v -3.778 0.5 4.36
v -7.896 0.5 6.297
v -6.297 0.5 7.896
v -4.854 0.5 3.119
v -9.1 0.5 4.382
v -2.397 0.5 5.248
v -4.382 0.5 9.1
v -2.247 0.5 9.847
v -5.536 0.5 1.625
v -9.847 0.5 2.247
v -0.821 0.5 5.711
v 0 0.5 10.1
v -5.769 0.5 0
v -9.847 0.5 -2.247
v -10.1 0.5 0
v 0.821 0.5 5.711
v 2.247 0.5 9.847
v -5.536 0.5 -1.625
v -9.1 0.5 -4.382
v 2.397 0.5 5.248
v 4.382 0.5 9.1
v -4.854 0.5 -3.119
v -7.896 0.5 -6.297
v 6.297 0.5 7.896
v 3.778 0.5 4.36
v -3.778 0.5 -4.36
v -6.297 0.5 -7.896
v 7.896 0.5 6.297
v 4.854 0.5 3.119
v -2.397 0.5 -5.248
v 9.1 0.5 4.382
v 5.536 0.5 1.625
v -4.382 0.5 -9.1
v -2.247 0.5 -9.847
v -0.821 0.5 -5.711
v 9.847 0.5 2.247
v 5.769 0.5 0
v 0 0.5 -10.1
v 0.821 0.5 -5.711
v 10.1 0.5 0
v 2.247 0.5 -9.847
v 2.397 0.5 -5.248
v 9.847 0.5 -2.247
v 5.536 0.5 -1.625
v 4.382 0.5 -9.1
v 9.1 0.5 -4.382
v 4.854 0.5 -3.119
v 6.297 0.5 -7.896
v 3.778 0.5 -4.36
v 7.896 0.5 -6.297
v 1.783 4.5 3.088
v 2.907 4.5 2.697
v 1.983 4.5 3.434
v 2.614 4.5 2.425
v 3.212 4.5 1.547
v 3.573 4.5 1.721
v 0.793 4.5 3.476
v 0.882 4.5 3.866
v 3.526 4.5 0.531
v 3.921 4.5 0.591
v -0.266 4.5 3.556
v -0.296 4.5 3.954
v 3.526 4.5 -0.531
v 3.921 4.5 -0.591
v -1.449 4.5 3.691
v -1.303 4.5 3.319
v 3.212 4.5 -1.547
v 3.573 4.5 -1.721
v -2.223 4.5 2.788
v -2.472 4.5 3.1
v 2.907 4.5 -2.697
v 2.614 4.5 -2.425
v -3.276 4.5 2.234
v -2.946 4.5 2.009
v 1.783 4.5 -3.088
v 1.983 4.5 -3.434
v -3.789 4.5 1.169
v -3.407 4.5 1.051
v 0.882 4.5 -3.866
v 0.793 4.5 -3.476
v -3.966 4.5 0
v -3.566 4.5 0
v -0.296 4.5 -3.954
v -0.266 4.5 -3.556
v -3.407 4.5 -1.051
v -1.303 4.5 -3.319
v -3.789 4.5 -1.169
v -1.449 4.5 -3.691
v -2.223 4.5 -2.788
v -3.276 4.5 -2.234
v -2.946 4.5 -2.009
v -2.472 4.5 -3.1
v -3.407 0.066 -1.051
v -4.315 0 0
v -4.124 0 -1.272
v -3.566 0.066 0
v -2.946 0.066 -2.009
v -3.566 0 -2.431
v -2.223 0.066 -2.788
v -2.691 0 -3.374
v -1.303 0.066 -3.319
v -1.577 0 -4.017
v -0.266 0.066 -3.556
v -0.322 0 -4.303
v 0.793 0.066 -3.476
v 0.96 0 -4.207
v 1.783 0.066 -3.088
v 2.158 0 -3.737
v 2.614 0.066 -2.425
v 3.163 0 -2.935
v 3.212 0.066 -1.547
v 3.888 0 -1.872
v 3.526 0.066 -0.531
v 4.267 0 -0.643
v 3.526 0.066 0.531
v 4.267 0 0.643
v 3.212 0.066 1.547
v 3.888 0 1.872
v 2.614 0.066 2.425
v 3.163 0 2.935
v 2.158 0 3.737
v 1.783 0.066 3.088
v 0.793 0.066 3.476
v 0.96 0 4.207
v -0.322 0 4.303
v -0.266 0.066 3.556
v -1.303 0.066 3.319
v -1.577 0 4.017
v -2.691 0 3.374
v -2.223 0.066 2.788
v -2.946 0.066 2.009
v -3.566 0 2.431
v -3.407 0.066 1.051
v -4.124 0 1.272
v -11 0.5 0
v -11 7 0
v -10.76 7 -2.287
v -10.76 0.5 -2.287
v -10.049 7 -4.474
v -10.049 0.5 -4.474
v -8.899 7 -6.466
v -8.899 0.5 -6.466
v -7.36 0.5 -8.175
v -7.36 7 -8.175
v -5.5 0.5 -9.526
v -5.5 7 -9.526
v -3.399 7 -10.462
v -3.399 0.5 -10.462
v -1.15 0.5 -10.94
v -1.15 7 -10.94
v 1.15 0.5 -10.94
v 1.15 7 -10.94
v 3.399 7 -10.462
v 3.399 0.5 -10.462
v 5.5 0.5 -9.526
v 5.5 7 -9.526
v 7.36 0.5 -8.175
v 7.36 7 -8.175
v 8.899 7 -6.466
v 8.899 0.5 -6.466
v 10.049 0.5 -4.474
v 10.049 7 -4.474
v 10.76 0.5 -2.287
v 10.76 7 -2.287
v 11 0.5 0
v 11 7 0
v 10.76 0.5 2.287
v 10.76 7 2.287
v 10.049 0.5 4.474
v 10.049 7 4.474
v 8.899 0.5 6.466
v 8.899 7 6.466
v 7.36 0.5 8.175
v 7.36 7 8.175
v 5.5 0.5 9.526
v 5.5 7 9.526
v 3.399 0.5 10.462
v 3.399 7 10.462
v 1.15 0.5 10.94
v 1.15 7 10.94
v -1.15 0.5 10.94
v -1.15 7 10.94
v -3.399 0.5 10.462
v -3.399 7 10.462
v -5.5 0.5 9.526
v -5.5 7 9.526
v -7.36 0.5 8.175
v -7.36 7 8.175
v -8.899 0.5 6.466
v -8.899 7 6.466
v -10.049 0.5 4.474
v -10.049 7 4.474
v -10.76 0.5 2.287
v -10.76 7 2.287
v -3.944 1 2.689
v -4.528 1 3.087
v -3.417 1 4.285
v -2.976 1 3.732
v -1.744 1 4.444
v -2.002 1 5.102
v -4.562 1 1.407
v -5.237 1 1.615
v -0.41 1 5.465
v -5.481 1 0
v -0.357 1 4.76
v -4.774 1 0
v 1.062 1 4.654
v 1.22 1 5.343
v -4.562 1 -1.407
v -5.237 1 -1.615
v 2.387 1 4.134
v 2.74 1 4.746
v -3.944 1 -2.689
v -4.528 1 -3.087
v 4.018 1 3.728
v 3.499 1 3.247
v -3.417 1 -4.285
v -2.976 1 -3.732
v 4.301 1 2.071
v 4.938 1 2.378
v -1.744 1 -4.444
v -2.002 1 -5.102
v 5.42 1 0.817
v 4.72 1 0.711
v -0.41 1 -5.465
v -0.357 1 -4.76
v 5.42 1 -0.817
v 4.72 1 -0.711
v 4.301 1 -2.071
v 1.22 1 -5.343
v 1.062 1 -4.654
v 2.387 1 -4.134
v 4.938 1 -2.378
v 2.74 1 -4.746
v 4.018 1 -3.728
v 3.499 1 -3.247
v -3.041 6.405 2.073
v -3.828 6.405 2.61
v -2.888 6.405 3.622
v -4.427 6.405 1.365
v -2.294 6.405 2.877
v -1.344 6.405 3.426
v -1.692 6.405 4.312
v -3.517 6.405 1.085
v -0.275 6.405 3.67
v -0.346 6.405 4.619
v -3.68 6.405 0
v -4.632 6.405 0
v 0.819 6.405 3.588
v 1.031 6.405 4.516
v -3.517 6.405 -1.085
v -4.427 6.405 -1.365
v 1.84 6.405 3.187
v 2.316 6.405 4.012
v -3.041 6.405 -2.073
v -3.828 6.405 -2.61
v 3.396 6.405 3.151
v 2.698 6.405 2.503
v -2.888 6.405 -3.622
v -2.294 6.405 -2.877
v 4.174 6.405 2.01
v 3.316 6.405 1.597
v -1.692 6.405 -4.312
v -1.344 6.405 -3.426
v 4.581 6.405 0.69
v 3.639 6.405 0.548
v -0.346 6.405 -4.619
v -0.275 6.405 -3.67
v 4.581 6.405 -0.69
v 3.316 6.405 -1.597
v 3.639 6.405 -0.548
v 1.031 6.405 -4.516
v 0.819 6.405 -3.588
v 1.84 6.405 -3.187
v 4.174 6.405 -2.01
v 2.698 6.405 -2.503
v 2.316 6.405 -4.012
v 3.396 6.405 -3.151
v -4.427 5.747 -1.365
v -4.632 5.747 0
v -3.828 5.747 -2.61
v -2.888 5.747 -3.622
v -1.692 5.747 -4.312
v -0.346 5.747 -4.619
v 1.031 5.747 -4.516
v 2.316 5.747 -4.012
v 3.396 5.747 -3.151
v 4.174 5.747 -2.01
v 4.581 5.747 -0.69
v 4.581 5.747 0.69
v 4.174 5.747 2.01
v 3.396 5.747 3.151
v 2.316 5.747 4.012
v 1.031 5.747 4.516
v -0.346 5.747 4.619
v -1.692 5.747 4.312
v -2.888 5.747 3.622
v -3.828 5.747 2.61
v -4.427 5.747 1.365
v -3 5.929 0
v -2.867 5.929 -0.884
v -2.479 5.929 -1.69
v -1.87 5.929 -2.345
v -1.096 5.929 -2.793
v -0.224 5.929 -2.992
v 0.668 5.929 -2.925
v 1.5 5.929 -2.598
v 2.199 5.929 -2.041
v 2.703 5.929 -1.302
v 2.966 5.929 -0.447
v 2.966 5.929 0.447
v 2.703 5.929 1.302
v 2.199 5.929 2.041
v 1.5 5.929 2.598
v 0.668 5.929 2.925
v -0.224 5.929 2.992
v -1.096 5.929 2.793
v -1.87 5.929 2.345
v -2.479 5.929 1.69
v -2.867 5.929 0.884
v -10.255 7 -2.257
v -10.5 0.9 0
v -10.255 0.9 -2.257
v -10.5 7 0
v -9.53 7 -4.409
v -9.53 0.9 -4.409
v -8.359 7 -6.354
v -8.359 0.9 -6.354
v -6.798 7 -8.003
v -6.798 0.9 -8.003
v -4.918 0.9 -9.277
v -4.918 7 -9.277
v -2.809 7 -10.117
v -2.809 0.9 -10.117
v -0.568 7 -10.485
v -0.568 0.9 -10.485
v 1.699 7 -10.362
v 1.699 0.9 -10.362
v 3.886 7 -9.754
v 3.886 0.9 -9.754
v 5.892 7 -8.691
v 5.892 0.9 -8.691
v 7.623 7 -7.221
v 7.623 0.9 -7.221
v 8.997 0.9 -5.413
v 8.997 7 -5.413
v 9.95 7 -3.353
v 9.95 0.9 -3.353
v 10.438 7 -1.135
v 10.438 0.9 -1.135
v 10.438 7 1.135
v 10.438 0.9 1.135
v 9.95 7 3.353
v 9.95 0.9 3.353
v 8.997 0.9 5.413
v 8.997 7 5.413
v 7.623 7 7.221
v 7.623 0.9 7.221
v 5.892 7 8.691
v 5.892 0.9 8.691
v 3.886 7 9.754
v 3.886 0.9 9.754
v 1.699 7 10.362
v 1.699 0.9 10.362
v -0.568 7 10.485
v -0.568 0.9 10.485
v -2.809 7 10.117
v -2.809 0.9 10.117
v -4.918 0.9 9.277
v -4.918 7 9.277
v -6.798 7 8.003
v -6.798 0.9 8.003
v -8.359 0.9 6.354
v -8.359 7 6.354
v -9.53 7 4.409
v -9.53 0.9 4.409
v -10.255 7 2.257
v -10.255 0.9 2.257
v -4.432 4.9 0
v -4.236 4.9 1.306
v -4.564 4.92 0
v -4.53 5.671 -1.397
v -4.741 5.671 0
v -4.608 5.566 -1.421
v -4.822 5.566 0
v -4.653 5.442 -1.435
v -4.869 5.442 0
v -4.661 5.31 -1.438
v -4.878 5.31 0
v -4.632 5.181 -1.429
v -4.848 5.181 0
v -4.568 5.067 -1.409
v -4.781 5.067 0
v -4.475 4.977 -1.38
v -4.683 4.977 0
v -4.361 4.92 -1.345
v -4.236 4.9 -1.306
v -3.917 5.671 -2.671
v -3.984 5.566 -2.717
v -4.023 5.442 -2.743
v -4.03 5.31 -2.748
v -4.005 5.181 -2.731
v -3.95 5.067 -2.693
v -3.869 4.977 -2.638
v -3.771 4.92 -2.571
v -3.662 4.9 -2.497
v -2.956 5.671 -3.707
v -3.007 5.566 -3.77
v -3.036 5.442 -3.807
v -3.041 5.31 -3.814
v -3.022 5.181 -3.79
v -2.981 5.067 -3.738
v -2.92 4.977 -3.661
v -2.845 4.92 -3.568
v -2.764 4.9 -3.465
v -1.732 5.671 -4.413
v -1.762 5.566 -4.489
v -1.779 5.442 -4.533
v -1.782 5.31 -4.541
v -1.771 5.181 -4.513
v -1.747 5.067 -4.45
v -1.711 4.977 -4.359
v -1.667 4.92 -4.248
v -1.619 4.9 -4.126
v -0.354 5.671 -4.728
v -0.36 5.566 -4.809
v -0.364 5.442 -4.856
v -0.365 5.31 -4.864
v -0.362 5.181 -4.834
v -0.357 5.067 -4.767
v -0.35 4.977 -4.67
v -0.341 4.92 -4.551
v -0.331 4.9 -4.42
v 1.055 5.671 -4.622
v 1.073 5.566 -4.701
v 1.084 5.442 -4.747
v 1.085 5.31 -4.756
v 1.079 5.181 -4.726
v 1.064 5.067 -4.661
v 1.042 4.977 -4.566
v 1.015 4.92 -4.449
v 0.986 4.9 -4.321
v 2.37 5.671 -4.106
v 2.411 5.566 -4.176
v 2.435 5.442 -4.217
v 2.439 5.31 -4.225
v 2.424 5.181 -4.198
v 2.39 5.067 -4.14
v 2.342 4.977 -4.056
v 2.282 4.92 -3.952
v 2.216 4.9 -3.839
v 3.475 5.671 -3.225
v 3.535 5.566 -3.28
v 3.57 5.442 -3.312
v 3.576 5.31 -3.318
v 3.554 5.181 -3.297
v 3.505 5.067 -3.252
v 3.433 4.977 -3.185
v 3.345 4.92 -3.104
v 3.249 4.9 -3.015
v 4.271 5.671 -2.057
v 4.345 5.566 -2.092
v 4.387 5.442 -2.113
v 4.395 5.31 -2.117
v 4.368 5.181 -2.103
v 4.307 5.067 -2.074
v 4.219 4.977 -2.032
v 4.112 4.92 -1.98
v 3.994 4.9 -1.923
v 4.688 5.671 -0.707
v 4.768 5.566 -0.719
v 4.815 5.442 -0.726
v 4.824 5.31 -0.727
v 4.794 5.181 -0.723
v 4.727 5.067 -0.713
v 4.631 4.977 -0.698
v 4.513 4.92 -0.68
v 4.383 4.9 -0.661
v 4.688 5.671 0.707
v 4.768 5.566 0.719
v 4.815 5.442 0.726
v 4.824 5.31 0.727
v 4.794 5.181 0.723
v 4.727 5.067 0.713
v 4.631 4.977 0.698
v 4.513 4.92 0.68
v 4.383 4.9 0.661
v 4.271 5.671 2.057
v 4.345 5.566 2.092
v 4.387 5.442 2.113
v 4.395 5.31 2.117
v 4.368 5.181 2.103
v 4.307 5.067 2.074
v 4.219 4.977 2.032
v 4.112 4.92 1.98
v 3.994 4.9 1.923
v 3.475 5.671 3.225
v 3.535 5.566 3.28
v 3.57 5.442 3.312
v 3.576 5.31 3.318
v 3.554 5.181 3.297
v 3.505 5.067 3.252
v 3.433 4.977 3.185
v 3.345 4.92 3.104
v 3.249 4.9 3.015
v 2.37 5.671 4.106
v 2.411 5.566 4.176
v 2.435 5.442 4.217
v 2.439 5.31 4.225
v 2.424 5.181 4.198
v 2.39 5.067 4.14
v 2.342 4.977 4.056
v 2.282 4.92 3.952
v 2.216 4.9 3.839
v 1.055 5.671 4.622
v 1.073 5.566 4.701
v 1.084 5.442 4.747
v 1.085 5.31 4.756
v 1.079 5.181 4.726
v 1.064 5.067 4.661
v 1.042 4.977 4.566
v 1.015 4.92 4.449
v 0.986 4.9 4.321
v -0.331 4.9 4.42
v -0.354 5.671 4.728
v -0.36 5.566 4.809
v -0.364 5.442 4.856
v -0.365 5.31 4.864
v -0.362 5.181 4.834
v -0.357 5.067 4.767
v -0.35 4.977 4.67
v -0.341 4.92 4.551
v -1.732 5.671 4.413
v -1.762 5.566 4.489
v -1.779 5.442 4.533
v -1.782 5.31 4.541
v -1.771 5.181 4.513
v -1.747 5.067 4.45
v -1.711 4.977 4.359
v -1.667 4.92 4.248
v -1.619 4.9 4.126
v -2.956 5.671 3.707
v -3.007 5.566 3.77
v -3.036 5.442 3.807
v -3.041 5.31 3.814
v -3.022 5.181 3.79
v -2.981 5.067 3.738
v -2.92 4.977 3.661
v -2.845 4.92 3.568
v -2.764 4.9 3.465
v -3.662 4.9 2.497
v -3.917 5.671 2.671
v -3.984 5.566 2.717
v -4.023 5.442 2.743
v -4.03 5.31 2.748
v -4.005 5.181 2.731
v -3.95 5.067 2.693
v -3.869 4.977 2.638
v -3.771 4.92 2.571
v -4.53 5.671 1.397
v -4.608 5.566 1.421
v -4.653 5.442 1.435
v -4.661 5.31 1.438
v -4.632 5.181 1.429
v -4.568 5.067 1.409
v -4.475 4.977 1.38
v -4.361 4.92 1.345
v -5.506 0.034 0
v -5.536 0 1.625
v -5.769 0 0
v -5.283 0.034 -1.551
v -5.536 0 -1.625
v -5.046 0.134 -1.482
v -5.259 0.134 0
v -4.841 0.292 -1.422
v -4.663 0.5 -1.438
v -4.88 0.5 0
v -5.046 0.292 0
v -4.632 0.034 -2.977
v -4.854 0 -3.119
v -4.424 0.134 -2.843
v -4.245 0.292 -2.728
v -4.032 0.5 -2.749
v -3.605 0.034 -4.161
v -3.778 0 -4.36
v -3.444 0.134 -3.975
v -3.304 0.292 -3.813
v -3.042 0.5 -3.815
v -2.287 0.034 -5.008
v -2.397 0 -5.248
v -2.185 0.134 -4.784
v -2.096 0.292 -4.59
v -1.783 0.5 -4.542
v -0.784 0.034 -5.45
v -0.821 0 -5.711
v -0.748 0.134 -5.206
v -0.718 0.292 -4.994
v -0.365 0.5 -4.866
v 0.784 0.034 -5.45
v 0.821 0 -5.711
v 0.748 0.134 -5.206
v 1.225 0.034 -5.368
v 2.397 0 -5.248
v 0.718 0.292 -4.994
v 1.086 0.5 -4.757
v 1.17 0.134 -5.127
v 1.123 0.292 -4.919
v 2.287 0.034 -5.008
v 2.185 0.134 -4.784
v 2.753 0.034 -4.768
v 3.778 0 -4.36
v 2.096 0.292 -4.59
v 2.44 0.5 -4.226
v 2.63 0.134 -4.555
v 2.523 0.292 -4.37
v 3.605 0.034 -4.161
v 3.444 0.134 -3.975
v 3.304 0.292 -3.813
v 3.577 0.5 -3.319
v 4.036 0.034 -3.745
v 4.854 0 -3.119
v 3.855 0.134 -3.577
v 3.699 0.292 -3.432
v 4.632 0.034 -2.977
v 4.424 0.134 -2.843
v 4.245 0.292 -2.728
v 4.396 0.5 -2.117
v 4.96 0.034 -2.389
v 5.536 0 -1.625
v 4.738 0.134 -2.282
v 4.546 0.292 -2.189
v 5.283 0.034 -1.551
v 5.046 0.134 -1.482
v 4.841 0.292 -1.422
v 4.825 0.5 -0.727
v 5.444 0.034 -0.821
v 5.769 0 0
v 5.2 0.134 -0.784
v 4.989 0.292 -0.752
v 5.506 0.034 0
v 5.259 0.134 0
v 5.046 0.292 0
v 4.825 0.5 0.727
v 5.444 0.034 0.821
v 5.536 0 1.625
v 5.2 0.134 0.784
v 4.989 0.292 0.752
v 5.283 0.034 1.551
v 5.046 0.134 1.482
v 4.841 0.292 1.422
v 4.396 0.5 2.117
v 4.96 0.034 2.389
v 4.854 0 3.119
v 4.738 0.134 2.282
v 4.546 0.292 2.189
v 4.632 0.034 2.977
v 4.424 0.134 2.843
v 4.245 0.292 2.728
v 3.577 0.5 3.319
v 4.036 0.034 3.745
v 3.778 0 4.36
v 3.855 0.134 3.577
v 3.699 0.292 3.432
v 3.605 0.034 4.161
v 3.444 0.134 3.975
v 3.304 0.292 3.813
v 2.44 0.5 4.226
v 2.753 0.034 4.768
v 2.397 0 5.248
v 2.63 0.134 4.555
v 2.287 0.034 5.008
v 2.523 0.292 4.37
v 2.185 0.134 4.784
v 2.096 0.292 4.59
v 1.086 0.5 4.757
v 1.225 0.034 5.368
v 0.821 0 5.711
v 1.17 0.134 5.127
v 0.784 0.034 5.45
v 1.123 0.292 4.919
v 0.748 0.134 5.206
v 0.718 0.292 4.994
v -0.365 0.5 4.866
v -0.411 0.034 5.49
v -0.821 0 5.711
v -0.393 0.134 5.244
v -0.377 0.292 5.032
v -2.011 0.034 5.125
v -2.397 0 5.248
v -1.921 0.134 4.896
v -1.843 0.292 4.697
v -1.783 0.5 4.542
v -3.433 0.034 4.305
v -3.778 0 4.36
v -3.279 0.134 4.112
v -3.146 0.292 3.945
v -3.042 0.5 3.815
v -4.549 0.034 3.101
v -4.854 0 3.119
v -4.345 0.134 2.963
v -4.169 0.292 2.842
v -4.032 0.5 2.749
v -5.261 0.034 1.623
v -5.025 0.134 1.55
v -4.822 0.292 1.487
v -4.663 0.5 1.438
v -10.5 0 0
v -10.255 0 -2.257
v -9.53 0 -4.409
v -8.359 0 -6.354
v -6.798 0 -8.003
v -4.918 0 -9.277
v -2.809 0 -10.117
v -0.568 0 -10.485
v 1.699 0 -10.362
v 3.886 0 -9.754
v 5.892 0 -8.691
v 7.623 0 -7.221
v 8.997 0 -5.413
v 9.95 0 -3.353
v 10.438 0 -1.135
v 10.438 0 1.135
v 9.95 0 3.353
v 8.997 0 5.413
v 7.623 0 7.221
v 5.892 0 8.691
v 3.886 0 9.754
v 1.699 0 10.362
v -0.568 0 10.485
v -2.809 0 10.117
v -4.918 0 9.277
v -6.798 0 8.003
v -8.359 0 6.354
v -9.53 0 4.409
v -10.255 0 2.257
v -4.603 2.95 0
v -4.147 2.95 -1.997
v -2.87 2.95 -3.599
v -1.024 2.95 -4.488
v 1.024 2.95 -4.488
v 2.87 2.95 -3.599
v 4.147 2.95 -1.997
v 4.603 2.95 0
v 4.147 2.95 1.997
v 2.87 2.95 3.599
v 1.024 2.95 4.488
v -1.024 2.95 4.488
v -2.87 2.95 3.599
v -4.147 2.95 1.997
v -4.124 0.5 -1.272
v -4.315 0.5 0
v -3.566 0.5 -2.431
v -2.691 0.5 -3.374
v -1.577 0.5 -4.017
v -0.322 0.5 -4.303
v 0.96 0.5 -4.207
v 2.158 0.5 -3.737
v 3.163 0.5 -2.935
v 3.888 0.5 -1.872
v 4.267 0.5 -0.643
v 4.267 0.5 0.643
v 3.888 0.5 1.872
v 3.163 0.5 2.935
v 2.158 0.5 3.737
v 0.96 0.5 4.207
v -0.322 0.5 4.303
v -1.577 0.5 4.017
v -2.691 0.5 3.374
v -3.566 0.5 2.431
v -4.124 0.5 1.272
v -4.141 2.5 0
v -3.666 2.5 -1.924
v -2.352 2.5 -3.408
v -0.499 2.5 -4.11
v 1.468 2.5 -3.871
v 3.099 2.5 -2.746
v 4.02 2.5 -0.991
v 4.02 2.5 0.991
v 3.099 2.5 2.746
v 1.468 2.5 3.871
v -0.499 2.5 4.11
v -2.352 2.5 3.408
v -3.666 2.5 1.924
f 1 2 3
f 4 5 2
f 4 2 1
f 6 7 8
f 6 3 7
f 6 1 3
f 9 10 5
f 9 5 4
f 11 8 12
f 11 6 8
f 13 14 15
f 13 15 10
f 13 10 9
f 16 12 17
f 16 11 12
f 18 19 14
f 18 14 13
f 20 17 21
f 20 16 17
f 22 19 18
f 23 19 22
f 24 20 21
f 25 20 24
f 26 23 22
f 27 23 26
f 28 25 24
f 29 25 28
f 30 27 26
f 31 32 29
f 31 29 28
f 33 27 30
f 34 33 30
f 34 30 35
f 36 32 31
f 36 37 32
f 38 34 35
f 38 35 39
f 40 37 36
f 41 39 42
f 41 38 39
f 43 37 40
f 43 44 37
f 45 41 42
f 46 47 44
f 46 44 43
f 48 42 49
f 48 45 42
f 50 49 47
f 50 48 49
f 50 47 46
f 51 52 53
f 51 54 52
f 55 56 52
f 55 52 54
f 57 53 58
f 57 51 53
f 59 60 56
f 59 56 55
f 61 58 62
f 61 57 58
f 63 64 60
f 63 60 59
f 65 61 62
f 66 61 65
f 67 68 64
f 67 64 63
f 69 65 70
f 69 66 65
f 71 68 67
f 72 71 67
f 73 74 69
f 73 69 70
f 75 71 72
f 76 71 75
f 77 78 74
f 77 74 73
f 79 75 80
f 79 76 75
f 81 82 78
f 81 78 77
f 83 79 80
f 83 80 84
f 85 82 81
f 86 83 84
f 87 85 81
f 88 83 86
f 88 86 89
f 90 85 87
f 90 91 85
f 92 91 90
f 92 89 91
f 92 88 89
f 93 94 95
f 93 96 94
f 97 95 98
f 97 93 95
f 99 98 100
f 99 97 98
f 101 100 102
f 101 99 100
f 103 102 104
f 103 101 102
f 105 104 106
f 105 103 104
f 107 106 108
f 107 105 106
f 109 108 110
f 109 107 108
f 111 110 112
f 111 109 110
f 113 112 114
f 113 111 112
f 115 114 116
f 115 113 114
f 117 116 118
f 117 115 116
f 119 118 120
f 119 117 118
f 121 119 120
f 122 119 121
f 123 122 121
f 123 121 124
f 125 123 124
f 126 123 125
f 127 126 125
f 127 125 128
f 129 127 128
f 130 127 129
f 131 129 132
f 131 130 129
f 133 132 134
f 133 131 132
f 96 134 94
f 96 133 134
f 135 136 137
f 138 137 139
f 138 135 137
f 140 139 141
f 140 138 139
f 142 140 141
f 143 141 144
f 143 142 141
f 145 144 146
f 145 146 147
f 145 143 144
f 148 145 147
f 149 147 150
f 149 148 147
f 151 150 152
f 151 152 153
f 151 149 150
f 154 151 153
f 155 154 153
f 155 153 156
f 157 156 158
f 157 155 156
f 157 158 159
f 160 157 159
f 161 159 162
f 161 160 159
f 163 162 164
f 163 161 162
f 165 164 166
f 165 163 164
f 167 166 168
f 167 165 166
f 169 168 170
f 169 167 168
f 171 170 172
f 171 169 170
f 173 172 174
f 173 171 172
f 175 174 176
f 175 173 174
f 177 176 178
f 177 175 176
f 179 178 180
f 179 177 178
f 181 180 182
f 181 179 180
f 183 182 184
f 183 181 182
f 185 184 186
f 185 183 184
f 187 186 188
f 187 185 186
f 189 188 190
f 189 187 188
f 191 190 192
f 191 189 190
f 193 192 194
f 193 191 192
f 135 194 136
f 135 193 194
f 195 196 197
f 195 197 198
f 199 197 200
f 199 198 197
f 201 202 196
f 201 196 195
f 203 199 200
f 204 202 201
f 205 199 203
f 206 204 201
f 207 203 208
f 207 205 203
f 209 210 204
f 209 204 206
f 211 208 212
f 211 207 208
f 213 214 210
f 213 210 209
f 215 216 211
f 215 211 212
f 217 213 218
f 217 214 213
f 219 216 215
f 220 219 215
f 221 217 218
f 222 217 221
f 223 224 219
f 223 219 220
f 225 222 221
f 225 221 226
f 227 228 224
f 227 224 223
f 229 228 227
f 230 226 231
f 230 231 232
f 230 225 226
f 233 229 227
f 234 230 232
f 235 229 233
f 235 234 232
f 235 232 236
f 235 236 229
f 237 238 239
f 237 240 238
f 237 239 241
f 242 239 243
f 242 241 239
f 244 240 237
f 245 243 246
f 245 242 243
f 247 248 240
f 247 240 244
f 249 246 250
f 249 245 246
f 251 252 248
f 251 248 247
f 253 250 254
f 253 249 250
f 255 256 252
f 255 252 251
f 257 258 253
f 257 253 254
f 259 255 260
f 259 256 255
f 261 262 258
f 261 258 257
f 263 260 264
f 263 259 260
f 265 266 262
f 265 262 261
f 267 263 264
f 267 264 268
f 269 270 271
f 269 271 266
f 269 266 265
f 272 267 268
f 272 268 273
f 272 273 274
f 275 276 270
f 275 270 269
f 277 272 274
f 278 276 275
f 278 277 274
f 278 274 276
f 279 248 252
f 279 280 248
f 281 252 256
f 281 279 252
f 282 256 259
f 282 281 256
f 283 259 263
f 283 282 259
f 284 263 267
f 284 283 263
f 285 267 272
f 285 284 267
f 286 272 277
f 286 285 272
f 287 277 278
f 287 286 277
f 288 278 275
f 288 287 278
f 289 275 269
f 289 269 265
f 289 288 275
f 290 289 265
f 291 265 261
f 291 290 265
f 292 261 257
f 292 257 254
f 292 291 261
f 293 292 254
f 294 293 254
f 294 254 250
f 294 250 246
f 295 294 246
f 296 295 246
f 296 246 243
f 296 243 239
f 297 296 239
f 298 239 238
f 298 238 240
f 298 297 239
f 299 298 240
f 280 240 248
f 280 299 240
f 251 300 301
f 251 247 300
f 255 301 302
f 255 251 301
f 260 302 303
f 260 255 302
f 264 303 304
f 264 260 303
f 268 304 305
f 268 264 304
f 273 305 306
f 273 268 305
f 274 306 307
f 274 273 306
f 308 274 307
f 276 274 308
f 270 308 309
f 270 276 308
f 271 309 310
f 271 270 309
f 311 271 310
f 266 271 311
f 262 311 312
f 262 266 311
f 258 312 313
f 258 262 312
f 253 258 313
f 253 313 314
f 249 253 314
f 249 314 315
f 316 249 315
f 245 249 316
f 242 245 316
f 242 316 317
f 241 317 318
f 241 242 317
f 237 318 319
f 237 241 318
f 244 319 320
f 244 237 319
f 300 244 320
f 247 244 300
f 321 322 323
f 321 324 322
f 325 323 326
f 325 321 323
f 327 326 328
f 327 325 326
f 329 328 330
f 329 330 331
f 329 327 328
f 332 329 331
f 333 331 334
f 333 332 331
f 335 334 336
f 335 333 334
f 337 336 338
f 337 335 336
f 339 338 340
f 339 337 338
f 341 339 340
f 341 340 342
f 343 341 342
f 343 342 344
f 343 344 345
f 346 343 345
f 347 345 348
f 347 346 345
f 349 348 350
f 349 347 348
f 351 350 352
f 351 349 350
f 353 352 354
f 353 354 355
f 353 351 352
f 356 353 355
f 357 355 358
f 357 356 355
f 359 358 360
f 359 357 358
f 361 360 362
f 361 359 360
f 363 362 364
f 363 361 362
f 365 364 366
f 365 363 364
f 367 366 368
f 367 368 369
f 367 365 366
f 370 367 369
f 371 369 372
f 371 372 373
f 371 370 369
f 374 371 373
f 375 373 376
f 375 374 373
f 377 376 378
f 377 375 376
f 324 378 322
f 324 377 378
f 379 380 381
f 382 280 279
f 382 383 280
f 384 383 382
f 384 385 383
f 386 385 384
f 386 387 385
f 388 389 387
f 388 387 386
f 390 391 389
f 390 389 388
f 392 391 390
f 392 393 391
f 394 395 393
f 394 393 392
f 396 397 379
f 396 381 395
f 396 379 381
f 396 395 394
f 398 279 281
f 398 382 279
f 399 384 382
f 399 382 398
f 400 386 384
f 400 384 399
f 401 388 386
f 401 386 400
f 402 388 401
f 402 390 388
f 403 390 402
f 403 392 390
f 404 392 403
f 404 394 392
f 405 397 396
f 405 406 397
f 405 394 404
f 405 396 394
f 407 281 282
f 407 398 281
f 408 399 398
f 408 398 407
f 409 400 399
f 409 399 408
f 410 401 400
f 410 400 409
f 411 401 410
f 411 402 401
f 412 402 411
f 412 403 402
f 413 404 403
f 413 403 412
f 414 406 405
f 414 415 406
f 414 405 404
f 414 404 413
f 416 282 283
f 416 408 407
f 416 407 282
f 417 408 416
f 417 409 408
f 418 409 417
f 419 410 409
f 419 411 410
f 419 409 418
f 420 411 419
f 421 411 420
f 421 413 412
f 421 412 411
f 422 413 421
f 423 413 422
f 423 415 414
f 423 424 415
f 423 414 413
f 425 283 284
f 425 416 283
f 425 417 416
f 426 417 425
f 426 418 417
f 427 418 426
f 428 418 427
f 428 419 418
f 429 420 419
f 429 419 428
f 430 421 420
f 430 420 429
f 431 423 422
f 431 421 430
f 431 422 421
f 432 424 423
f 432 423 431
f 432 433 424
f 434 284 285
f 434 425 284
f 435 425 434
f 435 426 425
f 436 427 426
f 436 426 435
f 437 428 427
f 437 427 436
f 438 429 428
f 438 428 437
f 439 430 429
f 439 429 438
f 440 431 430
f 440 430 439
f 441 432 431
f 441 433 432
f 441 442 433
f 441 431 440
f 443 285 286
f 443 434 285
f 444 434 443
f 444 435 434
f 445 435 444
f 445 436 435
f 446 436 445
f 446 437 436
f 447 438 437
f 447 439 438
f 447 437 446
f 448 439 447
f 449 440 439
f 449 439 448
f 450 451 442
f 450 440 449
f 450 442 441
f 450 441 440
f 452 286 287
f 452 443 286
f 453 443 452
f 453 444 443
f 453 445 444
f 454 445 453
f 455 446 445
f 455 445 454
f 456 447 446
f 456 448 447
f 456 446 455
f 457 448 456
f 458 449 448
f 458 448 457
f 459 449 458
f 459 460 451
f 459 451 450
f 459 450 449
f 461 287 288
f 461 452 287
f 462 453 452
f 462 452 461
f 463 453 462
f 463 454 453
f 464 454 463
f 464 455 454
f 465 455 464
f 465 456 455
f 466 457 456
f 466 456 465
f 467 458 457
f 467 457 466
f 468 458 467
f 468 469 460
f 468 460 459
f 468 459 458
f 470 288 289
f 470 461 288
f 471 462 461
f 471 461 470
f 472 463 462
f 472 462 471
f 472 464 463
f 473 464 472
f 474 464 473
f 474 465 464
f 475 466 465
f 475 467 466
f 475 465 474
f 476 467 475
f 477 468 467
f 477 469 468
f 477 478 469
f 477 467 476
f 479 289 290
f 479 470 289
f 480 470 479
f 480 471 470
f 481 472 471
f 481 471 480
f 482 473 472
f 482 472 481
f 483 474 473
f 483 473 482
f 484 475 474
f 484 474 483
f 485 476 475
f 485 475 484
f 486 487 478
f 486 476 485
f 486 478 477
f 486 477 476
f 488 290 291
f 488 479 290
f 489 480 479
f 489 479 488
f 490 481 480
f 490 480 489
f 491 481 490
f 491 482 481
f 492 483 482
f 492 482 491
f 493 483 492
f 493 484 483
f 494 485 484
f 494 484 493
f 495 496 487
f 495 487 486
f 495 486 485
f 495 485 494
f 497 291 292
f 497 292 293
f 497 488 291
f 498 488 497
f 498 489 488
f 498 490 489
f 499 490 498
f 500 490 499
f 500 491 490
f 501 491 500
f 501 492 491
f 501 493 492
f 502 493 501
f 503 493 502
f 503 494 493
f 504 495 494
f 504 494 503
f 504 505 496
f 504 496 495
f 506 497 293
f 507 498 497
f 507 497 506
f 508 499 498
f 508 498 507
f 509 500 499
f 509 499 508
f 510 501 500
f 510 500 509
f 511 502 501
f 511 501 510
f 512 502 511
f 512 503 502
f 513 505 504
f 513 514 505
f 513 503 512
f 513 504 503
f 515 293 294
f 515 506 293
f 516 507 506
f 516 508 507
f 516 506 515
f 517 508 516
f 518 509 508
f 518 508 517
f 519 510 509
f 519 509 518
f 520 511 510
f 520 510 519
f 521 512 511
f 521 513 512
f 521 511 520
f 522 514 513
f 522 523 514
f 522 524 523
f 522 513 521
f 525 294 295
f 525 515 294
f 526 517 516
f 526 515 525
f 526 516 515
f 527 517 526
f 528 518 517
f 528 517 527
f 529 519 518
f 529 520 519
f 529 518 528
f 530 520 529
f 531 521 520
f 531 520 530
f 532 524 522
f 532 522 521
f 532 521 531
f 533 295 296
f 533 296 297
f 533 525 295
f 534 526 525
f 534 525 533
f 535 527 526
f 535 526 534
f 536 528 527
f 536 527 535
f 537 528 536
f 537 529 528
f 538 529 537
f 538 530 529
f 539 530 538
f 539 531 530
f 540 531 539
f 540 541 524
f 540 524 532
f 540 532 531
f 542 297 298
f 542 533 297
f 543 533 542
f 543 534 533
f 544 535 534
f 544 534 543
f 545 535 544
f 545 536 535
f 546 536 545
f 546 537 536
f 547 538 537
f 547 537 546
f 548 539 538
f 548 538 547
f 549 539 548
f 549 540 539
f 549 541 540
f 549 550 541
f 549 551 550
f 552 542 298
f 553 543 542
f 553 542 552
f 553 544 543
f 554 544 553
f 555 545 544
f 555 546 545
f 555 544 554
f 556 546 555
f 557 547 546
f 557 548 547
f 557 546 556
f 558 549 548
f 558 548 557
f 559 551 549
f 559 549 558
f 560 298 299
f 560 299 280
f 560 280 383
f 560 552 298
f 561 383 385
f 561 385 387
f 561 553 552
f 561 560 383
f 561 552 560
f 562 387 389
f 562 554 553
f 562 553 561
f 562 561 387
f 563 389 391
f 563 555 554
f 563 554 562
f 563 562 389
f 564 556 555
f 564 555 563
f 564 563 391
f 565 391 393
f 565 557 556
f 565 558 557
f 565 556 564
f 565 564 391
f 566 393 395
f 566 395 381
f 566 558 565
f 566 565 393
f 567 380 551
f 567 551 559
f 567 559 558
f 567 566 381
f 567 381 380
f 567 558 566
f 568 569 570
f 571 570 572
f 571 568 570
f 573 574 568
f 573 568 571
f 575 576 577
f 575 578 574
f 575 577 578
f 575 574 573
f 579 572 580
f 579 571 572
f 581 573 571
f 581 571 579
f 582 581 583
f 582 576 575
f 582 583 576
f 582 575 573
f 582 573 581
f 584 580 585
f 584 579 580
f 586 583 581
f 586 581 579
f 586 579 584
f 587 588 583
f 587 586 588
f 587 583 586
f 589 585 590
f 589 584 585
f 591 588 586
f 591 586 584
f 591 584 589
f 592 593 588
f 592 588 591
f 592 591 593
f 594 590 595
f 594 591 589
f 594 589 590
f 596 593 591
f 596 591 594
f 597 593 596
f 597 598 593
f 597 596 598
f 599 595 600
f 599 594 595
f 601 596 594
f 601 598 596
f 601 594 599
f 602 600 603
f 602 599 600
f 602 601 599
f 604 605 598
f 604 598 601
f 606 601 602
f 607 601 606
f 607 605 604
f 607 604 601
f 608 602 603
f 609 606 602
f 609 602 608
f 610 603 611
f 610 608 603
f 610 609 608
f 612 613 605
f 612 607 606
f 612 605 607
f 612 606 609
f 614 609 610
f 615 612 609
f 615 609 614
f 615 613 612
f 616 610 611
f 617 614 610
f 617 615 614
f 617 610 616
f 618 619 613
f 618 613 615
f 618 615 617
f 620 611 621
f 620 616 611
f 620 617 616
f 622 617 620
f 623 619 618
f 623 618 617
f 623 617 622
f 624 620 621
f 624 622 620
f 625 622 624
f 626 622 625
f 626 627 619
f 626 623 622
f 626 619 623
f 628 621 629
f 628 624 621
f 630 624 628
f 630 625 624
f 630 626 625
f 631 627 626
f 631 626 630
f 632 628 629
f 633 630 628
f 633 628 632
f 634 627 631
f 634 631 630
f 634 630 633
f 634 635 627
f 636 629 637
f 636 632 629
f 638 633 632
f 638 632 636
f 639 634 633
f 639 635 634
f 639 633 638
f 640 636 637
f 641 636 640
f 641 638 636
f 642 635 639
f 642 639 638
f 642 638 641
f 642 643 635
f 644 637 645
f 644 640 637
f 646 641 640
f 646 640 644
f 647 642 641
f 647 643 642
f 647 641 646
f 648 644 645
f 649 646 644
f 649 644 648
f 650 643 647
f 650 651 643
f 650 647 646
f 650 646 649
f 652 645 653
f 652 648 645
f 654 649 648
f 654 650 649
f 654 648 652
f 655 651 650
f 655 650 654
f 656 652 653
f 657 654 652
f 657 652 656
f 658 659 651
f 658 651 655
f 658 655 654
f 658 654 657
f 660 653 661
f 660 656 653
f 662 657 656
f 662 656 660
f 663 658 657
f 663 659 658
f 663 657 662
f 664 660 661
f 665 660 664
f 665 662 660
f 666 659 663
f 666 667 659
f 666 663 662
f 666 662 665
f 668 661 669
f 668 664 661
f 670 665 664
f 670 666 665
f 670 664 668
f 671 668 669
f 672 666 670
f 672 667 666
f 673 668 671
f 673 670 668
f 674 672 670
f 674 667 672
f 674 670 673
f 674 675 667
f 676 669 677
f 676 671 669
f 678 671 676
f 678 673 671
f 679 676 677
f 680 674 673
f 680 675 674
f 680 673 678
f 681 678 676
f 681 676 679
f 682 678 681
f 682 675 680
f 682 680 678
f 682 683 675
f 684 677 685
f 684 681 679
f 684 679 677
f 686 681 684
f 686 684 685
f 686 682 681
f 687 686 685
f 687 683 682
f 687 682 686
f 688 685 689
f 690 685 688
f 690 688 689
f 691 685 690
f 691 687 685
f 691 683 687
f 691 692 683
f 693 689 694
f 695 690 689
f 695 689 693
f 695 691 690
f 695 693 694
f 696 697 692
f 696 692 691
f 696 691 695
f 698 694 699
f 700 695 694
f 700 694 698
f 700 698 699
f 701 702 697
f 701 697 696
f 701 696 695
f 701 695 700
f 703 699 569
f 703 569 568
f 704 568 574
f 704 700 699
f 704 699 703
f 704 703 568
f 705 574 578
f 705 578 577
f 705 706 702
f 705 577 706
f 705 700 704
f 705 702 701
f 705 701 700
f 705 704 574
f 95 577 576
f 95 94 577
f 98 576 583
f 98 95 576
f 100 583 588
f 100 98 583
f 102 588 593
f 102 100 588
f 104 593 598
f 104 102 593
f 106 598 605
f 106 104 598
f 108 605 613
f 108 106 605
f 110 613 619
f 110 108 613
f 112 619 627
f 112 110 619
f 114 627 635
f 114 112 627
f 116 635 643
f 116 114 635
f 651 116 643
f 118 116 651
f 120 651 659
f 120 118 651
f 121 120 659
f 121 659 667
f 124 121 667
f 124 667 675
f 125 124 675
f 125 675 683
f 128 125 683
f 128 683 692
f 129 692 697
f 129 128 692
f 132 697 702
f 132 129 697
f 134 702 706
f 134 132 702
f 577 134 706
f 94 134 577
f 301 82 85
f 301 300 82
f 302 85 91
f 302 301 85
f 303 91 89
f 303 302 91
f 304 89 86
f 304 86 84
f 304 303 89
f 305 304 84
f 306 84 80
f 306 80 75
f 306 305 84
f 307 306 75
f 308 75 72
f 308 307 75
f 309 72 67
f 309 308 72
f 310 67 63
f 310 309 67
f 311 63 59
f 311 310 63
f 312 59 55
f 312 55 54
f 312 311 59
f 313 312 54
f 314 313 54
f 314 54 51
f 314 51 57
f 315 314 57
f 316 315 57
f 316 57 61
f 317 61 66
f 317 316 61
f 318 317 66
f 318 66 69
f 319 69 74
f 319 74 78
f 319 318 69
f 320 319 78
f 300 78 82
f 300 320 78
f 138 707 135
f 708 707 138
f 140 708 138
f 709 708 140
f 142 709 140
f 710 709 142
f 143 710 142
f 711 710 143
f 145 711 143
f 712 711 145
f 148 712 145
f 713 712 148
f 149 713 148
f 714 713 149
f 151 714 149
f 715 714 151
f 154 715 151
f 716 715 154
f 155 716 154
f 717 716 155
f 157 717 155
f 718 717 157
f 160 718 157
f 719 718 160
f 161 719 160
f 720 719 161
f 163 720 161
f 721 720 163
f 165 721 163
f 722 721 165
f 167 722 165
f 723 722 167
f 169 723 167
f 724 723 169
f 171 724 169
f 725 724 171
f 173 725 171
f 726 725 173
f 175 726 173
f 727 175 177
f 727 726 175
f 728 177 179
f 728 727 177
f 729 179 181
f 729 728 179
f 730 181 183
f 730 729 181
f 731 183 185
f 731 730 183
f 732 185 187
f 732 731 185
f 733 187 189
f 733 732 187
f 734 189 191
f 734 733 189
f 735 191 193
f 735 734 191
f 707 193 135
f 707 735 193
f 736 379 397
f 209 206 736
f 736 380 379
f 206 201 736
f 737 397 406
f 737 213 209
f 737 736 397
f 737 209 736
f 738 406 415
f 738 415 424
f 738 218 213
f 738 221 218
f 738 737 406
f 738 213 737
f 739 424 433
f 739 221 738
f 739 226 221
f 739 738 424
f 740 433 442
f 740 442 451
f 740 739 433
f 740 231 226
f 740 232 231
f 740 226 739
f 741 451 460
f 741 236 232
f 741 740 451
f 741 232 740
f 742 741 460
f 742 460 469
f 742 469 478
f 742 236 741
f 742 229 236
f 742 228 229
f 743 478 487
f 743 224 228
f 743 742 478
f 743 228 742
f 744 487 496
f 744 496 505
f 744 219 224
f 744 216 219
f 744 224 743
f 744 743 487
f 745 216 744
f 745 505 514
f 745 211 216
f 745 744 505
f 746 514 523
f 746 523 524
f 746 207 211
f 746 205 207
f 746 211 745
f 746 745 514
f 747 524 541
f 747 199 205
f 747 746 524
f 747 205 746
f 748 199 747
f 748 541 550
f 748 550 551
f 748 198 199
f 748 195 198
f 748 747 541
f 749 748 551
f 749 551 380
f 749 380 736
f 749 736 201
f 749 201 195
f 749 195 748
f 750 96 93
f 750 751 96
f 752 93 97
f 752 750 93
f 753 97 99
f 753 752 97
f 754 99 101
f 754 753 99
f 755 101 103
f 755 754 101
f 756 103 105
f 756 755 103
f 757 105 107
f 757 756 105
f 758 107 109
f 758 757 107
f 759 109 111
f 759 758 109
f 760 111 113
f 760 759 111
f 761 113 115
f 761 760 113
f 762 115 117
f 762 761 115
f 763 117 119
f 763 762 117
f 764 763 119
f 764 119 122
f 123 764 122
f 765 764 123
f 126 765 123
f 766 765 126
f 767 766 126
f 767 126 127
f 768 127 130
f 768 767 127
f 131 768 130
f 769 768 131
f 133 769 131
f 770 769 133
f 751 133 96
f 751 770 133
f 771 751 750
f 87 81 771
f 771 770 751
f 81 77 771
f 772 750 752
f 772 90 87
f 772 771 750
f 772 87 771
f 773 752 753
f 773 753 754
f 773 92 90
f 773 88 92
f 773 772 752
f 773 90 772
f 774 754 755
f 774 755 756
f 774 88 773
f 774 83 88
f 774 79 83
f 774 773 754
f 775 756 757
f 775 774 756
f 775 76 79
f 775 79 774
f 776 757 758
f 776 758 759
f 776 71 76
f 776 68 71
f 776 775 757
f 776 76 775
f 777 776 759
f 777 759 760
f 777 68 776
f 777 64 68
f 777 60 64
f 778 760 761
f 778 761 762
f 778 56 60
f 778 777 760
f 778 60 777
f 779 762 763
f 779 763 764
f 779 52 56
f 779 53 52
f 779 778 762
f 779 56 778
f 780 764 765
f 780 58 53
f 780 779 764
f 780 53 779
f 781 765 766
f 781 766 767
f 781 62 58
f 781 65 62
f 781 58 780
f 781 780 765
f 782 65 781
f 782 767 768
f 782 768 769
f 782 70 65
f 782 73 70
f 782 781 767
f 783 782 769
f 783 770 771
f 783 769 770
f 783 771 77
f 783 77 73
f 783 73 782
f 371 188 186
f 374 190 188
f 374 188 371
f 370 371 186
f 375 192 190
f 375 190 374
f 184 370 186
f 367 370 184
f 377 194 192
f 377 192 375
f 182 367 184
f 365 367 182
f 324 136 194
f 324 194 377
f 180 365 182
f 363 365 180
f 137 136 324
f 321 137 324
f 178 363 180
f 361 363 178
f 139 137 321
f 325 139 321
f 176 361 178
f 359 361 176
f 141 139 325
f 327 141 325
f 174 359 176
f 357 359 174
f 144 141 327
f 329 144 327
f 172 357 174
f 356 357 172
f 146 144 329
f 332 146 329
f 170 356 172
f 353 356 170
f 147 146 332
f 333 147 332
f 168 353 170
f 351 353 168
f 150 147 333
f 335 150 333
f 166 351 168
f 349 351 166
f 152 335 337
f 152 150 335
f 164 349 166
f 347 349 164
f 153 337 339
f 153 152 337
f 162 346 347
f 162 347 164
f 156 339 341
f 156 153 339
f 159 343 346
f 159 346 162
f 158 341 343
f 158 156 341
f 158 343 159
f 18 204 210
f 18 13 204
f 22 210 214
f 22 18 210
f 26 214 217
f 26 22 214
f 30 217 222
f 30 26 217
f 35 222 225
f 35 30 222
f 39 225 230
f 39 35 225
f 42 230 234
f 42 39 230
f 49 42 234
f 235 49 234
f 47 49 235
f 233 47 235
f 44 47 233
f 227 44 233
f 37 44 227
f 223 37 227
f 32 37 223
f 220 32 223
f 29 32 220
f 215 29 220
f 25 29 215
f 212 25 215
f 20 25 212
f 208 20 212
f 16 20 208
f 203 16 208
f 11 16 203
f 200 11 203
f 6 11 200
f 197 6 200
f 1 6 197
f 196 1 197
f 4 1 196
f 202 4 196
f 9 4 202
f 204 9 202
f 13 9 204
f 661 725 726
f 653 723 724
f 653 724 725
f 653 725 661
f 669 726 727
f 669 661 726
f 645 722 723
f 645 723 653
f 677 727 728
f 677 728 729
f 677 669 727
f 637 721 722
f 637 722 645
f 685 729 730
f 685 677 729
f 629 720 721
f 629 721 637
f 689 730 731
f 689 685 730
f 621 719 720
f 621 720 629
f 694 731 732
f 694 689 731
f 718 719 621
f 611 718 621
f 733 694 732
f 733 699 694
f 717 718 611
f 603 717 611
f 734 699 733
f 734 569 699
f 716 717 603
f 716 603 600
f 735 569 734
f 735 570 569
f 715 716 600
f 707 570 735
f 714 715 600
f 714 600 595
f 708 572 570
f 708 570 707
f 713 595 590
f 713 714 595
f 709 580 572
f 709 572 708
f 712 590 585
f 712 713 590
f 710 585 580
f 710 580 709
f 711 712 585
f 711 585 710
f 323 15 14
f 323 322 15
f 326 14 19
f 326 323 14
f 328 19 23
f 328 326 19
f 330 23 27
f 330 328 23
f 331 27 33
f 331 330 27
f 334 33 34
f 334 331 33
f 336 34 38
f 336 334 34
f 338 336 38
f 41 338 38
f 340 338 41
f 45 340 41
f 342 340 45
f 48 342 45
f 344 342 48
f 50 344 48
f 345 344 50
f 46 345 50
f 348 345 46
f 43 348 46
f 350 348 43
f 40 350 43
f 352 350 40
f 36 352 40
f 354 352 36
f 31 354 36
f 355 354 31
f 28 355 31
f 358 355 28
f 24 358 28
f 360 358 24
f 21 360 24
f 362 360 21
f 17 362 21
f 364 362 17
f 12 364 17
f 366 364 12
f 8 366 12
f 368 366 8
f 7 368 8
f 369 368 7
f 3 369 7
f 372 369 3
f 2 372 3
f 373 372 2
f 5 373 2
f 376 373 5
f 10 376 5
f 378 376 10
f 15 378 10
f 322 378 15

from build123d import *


with BuildPart() as part:
    # 草图1 → 旋转1 (revolve)
    with BuildSketch(Plane.XY):
        with BuildLine():
            Line((-10.5, 0), (-5.769439135, 0))
            ThreePointArc((-5.769439135, 0), (-5.259121106, 0.133562425), (-4.879665027, 0.5))
            Line((-4.879665027, 0.5), (-4.315491633, 0))
            Line((-4.315491633, 0), (-3.565536978, 0.06561253))
            Line((-3.565536978, 0.06561253), (-4.315491633, 0.5))
            Line((-4.315491633, 0.5), (-3.965536978, 4.5))
            Line((-3.965536978, 4.5), (-3.565536978, 4.5))
            Line((-3.565536978, 4.5), (-3, 5.928571429))
            Line((-3, 5.928571429), (-3.680070479, 6.404761905))
            Line((-3.680070479, 6.404761905), (-4.632451432, 6.404761905))
            Line((-4.632451432, 6.404761905), (-4.632451432, 5.747213595))
            ThreePointArc((-4.632451432, 5.747213595), (-4.867701612, 5.244464966), (-4.432451432, 4.9))
            Line((-4.432451432, 4.9), (-4.77365722, 1))
            Line((-4.77365722, 1), (-5.480764001, 1))
            Line((-5.480764001, 1), (-5.769439135, 0.5))
            Line((-5.769439135, 0.5), (-10.1, 0.5))
            Line((-10.1, 0.5), (-10.5, 0.9))
            Line((-10.5, 0.9), (-10.5, 7))
            Line((-10.5, 7), (-11, 7))
            Line((-11, 7), (-11, 0.5))
            Line((-11, 0.5), (-10.5, 0))
        make_face()
    revolve(axis=Axis((0, 5.977335763, 0), (0, -1, 0)))


solid = part.part
